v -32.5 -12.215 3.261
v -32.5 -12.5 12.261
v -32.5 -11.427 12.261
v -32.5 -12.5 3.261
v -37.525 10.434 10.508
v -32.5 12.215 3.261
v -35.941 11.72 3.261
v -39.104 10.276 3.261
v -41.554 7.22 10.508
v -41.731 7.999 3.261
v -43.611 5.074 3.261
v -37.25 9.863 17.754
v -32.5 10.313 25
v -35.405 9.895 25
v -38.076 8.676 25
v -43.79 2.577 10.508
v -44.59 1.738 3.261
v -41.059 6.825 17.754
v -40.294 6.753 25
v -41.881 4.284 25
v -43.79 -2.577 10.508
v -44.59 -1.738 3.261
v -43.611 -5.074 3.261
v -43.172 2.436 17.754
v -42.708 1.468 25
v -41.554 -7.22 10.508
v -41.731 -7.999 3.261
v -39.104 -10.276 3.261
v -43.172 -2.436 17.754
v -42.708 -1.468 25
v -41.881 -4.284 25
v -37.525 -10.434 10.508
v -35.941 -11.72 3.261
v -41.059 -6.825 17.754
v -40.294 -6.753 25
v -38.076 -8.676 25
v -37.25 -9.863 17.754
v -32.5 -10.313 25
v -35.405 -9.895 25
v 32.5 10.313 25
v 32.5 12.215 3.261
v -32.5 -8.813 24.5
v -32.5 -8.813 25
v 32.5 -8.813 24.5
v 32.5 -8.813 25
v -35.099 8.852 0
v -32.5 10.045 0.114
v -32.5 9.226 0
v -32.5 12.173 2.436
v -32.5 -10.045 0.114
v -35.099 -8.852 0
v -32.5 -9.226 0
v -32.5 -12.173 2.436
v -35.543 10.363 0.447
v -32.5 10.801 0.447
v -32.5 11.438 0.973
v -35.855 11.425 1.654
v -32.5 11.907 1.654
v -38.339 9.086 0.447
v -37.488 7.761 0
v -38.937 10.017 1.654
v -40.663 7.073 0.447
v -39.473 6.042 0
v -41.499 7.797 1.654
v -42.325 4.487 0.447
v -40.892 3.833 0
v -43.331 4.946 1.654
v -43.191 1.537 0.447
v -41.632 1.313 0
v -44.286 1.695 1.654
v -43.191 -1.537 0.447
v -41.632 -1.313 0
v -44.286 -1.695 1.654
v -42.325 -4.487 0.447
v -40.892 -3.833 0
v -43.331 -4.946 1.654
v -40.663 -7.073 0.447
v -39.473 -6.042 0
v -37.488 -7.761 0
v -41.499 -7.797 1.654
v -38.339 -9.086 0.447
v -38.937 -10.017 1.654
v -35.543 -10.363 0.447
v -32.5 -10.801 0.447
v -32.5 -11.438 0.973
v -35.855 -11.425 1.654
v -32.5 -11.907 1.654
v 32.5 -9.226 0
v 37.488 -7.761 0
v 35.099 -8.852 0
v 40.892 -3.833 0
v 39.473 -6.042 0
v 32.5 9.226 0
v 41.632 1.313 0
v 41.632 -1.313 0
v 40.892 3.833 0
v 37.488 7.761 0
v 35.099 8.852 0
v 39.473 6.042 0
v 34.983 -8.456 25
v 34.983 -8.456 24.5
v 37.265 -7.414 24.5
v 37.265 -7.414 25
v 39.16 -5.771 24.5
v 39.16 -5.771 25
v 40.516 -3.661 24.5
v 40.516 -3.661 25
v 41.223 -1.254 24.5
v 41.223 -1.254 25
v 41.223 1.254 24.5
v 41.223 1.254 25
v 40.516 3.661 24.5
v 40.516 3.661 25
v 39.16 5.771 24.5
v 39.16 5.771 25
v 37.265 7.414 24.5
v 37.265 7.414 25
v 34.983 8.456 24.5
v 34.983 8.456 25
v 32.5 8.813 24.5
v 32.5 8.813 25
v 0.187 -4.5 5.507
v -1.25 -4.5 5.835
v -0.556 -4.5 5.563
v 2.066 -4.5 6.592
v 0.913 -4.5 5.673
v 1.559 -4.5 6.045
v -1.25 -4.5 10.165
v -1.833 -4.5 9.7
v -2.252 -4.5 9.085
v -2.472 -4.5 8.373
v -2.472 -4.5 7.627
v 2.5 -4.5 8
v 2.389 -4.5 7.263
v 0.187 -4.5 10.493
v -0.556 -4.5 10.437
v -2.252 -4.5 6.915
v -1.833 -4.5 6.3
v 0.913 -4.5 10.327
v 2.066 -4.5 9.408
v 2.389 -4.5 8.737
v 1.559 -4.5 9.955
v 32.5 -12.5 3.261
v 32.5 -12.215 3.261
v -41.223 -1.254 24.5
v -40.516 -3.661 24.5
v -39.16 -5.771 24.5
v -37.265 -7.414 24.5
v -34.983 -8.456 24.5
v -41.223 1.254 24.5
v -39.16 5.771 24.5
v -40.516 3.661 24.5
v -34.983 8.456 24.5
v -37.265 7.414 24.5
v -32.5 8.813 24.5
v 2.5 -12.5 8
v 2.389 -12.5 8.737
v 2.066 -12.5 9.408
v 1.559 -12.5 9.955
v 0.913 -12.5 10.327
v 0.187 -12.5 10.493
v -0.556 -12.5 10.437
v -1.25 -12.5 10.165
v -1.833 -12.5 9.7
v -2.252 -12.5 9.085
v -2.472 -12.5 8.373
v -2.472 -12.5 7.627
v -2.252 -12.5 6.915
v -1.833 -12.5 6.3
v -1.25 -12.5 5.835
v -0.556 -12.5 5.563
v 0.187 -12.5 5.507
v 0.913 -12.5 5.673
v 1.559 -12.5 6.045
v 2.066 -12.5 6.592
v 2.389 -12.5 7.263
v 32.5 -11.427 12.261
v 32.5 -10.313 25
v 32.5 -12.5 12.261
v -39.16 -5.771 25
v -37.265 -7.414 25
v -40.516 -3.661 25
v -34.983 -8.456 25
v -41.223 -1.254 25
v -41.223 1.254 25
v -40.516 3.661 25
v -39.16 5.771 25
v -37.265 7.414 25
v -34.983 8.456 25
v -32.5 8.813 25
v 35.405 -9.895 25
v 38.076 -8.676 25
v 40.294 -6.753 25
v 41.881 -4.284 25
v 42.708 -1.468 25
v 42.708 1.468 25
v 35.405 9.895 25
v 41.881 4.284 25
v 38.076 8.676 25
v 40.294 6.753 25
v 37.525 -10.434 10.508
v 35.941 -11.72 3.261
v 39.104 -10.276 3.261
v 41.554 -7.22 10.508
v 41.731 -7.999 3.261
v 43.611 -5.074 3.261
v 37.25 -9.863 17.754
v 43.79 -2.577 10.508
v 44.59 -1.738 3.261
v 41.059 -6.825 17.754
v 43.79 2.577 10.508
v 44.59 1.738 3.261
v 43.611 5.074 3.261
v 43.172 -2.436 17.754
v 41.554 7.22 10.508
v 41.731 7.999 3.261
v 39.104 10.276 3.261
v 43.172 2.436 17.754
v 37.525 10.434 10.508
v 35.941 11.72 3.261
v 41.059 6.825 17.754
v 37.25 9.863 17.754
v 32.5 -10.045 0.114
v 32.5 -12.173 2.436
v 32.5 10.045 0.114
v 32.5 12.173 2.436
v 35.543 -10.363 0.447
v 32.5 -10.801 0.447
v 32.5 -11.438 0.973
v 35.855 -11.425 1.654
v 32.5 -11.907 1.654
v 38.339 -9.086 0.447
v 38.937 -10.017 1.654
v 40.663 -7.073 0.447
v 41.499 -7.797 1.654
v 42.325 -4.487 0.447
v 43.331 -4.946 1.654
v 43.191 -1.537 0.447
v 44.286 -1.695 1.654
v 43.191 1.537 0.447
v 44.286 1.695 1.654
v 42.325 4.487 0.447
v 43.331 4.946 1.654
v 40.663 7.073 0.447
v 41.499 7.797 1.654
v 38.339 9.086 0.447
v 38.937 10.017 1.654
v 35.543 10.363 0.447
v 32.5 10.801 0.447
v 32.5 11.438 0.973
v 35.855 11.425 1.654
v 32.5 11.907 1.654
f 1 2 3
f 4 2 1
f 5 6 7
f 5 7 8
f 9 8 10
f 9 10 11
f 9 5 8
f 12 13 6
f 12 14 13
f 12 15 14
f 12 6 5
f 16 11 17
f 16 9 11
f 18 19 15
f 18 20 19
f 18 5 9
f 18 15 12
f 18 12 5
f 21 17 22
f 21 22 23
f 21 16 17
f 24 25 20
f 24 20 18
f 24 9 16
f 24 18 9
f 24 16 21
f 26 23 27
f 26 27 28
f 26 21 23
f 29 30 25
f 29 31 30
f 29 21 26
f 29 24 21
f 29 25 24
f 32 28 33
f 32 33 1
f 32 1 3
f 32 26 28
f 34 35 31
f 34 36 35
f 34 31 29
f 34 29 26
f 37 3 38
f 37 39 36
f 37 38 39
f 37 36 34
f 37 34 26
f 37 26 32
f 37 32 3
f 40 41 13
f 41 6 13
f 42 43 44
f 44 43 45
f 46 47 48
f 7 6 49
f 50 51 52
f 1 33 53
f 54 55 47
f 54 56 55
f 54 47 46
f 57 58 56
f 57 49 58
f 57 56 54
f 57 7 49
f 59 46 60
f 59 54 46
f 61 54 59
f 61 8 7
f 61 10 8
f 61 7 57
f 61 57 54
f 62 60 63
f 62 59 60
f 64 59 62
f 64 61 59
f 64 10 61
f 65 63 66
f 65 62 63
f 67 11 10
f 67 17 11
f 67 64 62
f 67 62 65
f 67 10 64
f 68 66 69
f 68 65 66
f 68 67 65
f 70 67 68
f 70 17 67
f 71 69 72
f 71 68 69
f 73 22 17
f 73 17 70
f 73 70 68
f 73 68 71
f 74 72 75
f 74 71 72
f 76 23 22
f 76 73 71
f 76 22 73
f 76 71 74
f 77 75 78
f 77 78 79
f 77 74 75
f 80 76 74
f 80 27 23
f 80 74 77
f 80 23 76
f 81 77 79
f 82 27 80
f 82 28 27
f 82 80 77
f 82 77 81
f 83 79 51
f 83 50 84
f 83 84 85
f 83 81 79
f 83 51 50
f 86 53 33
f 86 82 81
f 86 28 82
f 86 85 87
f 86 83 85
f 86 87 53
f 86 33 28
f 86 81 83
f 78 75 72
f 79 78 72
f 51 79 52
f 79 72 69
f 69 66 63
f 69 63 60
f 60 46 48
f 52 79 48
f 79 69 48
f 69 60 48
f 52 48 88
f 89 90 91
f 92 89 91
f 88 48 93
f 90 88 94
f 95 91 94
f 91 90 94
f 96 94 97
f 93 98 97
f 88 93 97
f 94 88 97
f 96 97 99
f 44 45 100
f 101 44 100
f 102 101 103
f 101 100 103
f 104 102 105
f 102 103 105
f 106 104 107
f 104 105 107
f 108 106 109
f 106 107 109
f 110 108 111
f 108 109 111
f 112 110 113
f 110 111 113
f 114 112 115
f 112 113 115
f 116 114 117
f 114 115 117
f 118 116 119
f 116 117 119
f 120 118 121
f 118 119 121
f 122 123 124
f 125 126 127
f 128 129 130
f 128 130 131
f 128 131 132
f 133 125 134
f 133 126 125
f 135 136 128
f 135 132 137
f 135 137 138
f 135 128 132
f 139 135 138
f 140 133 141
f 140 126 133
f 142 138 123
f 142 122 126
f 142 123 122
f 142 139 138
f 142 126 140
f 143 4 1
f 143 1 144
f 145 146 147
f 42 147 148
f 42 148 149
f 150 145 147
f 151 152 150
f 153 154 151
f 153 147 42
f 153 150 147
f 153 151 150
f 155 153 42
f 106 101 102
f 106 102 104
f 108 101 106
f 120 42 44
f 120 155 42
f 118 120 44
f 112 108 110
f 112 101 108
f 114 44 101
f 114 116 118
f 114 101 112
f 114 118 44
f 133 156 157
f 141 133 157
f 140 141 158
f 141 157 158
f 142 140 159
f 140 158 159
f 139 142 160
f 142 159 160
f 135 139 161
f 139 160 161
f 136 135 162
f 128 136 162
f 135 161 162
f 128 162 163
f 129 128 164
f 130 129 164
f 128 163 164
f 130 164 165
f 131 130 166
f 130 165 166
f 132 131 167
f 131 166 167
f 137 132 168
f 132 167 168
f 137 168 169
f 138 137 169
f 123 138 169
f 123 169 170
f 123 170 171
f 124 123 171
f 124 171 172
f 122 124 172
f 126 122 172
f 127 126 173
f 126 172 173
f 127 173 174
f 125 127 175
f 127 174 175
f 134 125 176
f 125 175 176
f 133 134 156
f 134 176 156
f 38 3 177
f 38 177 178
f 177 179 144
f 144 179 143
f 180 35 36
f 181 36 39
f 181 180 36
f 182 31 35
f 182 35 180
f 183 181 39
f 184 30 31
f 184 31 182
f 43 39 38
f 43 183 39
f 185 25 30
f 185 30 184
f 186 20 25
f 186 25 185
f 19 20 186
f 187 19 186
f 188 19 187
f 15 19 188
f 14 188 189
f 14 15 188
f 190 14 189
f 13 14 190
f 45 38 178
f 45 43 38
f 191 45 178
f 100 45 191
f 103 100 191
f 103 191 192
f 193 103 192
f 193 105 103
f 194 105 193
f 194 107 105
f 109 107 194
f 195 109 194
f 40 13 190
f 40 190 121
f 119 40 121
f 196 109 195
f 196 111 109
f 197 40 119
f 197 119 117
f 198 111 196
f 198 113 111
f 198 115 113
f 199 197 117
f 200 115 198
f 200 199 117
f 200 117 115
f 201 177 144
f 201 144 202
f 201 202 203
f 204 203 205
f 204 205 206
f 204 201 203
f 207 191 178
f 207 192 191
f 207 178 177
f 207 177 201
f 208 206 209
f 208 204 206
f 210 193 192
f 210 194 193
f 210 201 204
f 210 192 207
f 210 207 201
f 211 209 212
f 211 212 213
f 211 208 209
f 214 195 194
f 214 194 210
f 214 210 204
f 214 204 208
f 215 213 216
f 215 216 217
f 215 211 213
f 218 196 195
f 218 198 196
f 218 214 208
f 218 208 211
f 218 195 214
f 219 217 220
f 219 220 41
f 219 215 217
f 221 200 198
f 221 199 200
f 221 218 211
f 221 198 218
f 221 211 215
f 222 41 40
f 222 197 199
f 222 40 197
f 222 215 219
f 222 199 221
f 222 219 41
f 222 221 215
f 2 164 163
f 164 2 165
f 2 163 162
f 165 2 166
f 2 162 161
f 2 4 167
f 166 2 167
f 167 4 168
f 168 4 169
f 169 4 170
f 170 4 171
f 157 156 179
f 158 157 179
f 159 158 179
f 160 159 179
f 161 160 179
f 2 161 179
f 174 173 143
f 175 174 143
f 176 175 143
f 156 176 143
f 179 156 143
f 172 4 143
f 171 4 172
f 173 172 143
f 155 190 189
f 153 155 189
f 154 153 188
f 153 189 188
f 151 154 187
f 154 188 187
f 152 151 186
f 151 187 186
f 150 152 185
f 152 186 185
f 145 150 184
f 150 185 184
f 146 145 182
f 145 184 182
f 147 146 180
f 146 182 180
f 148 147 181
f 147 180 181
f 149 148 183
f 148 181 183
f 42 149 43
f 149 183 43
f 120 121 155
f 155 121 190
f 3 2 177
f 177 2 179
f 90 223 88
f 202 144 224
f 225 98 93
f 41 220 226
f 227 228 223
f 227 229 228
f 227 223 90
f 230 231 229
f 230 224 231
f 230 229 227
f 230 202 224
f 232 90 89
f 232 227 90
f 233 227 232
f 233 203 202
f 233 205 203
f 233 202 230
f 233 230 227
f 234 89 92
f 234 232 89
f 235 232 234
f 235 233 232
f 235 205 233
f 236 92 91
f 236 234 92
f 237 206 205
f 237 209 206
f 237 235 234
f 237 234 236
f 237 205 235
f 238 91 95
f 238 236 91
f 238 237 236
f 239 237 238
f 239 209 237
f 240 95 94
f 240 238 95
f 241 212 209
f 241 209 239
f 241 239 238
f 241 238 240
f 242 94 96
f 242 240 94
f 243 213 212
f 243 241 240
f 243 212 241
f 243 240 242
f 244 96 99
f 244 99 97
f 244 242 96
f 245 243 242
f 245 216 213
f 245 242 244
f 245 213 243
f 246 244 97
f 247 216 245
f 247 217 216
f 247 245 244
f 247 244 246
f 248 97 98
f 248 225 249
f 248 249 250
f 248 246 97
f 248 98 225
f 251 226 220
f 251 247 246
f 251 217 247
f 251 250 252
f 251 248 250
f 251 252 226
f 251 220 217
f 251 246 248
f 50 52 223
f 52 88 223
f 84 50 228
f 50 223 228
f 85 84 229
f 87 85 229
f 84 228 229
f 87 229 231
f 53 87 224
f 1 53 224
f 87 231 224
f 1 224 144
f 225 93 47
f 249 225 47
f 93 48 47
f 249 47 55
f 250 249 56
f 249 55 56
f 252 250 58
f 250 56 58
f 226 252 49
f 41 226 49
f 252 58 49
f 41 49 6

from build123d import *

# Parameters (mm, degrees)
BOSS_EXTRUDE1_DEPTH = 25
BOSS_EXTRUDE1_TAPER = 5
FILLET1_R           = 3
CUT_EXTRUDE1_DEPTH  = 0.5
BOSS_EXTRUDE2_REACH = 26.726
SKETCH5_W           = 65
SKETCH5_H           = 9
SKETCH6_R           = 2.5
CUT_EXTRUDE2_DEPTH  = 8


with BuildPart() as part:
    # Sketch1 → Boss-Extrude1 (new body)
    with BuildSketch(Plane.XY):
        with BuildLine():
            ThreePointArc((-32.5, 12.5), (-45, 0), (-32.5, -12.5))
            Line((-32.5, -12.5), (32.5, -12.5))
            ThreePointArc((32.5, -12.5), (45, 0), (32.5, 12.5))
            Line((32.5, 12.5), (-32.5, 12.5))
        make_face()
    extrude(amount=BOSS_EXTRUDE1_DEPTH, taper=BOSS_EXTRUDE1_TAPER)

    # Fillet1
    fillet1_edges = [part.edges().sort_by_distance(p)[0] for p in [
        (0, 12.5, 0),
        (45, 0, 0),
        (0, -12.5, 0),
        (-45, 0, 0),
    ]]
    fillet(fillet1_edges, radius=FILLET1_R)

    # Sketch4 → Cut-Extrude1 (cut)
    with BuildSketch(Plane.XY.offset(25)):
        with BuildLine():
            Line((-32.5, -8.812783412), (32.5, -8.812783412))
            ThreePointArc((32.5, -8.812783412), (41.312783412, 0), (32.5, 8.812783412))
            Line((32.5, 8.812783412), (-32.5, 8.812783412))
            ThreePointArc((-32.5, 8.812783412), (-41.312783412, 0), (-32.5, -8.812783412))
        make_face()
    extrude(amount=-CUT_EXTRUDE1_DEPTH, mode=Mode.SUBTRACT)

    # Sketch5 → Boss-Extrude2 (add, up to next)
    with BuildSketch(Plane(origin=(0, -12.5, 0), x_dir=(1, 0, 0), z_dir=(0, 1, 0)), mode=Mode.PRIVATE) as boss_extrude2_sk1:
        with Locations((0, -7.761467228)):
            Rectangle(SKETCH5_W, SKETCH5_H)
    boss_extrude2_tool1 = extrude(boss_extrude2_sk1.sketch, amount=BOSS_EXTRUDE2_REACH, mode=Mode.PRIVATE) - part.part
    add(boss_extrude2_tool1.solids().sort_by_distance((0, -12.5, 7.761467))[0])

    # Sketch6 → Cut-Extrude2 (cut)
    with BuildSketch(Plane.XZ.offset(12.5)):
        with Locations((0, 8)):
            Circle(SKETCH6_R)
    extrude(amount=-CUT_EXTRUDE2_DEPTH, mode=Mode.SUBTRACT)


solid = part.part
